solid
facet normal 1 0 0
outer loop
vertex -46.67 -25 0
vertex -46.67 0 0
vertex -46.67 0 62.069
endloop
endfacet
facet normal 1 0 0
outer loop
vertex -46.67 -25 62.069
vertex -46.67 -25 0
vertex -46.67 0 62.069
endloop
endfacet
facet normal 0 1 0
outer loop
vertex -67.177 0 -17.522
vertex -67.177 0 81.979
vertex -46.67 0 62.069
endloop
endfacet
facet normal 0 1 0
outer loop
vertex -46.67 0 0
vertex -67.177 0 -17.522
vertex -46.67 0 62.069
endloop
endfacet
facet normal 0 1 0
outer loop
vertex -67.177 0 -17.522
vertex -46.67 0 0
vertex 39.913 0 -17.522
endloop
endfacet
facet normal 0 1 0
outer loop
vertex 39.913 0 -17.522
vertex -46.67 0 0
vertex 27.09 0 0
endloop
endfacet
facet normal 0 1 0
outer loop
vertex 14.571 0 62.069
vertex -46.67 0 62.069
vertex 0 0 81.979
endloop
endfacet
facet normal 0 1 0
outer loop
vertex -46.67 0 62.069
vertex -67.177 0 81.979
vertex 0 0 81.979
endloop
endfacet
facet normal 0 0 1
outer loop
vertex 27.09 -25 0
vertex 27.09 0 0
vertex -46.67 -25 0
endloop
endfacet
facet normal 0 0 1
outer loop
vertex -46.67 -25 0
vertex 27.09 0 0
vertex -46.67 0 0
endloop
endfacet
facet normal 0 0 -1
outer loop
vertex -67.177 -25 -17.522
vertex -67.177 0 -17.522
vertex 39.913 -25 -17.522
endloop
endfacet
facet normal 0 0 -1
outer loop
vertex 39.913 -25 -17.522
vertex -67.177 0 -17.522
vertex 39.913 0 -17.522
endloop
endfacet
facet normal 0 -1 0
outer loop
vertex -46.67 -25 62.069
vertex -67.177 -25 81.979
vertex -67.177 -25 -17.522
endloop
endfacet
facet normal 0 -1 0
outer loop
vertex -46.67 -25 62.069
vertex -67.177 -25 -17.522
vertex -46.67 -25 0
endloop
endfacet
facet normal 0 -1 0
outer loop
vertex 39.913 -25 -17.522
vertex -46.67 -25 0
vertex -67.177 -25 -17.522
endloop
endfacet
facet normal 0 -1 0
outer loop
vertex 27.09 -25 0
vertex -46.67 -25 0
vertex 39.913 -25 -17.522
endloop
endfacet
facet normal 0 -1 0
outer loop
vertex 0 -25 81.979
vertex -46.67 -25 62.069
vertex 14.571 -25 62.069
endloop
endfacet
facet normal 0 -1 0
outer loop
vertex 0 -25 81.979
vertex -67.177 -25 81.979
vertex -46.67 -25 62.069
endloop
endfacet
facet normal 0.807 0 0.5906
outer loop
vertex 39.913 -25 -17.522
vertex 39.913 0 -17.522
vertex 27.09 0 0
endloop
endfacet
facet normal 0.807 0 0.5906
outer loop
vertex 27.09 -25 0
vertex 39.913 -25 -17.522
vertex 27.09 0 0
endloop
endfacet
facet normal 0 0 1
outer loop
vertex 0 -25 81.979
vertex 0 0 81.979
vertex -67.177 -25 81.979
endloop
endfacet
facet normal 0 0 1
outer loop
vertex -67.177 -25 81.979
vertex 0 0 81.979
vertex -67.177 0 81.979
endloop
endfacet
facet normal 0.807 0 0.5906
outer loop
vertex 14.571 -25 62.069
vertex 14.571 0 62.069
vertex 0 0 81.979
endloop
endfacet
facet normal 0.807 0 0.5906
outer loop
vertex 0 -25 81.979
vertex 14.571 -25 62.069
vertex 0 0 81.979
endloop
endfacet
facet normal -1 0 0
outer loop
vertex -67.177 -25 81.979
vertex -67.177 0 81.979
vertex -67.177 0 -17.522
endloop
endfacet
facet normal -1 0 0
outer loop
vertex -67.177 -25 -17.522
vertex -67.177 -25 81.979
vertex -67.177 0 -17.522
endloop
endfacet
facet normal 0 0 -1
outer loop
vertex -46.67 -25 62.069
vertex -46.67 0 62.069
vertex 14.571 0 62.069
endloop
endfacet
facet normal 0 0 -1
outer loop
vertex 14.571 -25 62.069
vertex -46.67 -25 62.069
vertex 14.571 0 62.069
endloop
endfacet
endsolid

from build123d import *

# Parameters (mm, degrees)
F1_DEPTH = 25


with BuildPart() as f1:
    # F0 (on Front) → F1 (new body)
    with BuildSketch(Plane.XZ):
        Polygon((-46.670273, 62.068569), (-67.177035, 81.979203), (-67.177035, 0), (-46.670273, 0), align=None)
        Polygon((-46.670273, 81.979203), (-67.177035, 81.979203), (-46.670273, 62.068569), align=None)
        Polygon((-46.670273, 0), (-67.177035, 0), (-67.177035, -14.897), (-67.177035, -17.522057), (0, -17.522057), (39.91276, -17.522057), (27.090134, 0), align=None)
        Polygon((-46.670273, 81.979203), (-46.670273, 62.068569), (14.570585, 62.068569), (0, 81.979203), align=None)
    extrude(amount=F1_DEPTH)


solid = f1.part
